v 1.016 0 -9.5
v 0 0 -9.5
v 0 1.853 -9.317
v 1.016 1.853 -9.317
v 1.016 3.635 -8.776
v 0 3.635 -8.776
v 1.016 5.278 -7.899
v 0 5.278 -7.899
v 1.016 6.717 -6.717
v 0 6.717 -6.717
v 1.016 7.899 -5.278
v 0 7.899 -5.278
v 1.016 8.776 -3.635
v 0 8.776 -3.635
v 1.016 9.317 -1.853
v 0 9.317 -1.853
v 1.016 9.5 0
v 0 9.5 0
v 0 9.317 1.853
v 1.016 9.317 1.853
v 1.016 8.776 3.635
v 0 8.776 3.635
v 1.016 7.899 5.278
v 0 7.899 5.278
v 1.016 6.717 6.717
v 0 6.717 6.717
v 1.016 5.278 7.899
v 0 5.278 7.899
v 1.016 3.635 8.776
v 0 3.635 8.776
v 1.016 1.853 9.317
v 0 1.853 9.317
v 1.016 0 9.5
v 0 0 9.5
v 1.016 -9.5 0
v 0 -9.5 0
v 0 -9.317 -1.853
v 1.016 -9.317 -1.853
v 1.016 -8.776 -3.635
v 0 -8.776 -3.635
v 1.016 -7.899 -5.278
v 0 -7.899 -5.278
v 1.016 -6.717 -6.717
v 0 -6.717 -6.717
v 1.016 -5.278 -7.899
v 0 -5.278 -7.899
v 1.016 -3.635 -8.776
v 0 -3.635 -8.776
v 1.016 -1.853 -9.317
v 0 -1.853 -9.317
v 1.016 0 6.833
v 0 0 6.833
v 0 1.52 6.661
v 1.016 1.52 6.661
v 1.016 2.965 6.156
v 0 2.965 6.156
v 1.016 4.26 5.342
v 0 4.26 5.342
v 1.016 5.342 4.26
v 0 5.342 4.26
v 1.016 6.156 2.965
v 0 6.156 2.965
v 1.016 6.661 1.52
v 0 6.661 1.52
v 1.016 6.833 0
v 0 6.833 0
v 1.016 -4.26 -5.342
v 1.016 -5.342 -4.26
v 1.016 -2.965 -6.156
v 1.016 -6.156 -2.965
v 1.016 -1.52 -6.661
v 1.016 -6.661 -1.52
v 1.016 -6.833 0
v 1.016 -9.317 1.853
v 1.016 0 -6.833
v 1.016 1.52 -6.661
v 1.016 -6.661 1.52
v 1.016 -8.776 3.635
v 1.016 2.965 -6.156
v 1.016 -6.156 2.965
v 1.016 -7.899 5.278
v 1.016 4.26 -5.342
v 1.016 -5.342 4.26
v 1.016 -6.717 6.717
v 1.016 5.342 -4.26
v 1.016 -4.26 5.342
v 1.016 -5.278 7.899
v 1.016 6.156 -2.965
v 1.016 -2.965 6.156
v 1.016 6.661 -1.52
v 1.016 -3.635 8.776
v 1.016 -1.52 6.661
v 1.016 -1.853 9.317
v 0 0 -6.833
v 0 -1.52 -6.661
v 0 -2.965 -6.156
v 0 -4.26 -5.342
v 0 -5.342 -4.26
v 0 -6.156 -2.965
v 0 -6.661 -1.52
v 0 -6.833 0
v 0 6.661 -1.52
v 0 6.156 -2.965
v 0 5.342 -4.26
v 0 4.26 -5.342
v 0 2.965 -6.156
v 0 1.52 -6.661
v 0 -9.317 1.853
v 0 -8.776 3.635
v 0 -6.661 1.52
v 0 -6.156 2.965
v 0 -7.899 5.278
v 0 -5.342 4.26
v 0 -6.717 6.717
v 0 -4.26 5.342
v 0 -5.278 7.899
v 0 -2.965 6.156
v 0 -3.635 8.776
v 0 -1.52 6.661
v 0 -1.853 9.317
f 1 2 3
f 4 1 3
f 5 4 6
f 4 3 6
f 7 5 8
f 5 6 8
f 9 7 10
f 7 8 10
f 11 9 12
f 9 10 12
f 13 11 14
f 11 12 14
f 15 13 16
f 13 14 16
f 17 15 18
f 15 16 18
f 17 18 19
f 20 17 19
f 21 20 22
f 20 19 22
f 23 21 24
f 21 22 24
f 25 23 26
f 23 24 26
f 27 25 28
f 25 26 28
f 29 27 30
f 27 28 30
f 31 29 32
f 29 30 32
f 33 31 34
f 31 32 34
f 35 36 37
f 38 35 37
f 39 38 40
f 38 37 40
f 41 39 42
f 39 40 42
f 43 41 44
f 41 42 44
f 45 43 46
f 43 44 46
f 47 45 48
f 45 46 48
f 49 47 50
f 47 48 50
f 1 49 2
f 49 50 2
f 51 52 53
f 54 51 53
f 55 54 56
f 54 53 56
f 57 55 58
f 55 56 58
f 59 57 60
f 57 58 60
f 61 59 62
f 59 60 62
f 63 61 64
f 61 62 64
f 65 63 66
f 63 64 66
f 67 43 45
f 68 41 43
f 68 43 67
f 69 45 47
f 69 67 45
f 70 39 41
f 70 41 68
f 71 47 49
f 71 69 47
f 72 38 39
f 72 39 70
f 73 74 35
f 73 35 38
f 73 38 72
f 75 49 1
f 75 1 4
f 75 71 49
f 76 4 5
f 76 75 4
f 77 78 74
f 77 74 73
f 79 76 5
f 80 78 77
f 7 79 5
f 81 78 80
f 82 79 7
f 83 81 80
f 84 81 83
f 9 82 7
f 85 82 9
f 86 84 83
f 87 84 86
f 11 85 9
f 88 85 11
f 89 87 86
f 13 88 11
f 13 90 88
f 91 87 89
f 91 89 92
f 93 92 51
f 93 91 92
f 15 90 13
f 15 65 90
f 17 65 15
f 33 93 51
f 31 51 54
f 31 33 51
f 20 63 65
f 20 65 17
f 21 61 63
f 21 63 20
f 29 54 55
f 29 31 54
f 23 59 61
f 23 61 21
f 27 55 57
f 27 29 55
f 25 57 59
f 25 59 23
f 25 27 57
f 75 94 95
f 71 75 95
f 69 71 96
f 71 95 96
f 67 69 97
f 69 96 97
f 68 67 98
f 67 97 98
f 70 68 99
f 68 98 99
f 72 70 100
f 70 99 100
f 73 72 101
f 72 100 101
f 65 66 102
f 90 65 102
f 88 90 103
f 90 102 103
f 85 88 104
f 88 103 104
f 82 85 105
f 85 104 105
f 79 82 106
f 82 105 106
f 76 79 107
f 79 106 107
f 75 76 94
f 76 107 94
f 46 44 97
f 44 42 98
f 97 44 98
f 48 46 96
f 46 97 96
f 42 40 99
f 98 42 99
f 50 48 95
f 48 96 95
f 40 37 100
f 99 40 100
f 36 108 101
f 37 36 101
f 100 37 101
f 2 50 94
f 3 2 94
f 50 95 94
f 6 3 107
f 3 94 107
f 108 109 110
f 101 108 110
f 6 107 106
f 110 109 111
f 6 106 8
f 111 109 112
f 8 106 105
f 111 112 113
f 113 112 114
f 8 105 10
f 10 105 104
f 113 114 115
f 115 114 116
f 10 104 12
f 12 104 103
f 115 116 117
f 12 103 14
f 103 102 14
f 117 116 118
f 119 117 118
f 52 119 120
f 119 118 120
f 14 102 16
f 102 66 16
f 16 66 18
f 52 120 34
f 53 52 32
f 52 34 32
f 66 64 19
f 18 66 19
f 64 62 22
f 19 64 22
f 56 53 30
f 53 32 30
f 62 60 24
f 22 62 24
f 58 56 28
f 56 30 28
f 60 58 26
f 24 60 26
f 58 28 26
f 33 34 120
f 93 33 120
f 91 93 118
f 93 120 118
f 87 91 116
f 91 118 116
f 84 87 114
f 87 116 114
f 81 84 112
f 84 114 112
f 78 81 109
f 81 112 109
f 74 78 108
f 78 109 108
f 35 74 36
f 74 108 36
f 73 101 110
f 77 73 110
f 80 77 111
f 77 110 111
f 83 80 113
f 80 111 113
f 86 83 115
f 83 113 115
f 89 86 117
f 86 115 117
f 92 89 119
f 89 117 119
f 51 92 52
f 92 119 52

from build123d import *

# Parameters (mm, degrees)
F1_DEPTH = 1.016


with BuildPart() as f1:
    # F0 (on Right) → F1 (new body)
    with BuildSketch(Plane.YZ):
        with BuildLine():
            Line((0, 6.8326), (0, 9.4996))
            ThreePointArc((0, 9.4996), (-6.717232, 6.717232), (-9.4996, 0))
            Line((-9.4996, 0), (-6.8326, 0))
            ThreePointArc((-6.8326, 0), (-4.831378, 4.831378), (0, 6.8326))
        make_face()
        with BuildLine():
            Line((6.8326, 0), (9.4996, 0))
            ThreePointArc((9.4996, 0), (6.717232, 6.717232), (0, 9.4996))
            Line((0, 9.4996), (0, 6.8326))
            ThreePointArc((0, 6.8326), (4.831378, 4.831378), (6.8326, 0))
        make_face()
        with BuildLine():
            ThreePointArc((0, -9.4996), (6.717232, -6.717232), (9.4996, 0))
            Line((9.4996, 0), (6.8326, 0))
            ThreePointArc((6.8326, 0), (4.831378, -4.831378), (0, -6.8326))
            Line((0, -6.8326), (0, -9.4996))
        make_face()
        with BuildLine():
            ThreePointArc((-9.4996, 0), (-6.717232, -6.717232), (0, -9.4996))
            Line((0, -9.4996), (0, -6.8326))
            ThreePointArc((0, -6.8326), (-4.831378, -4.831378), (-6.8326, 0))
            Line((-6.8326, 0), (-9.4996, 0))
        make_face()
    extrude(amount=F1_DEPTH)


solid = f1.part
